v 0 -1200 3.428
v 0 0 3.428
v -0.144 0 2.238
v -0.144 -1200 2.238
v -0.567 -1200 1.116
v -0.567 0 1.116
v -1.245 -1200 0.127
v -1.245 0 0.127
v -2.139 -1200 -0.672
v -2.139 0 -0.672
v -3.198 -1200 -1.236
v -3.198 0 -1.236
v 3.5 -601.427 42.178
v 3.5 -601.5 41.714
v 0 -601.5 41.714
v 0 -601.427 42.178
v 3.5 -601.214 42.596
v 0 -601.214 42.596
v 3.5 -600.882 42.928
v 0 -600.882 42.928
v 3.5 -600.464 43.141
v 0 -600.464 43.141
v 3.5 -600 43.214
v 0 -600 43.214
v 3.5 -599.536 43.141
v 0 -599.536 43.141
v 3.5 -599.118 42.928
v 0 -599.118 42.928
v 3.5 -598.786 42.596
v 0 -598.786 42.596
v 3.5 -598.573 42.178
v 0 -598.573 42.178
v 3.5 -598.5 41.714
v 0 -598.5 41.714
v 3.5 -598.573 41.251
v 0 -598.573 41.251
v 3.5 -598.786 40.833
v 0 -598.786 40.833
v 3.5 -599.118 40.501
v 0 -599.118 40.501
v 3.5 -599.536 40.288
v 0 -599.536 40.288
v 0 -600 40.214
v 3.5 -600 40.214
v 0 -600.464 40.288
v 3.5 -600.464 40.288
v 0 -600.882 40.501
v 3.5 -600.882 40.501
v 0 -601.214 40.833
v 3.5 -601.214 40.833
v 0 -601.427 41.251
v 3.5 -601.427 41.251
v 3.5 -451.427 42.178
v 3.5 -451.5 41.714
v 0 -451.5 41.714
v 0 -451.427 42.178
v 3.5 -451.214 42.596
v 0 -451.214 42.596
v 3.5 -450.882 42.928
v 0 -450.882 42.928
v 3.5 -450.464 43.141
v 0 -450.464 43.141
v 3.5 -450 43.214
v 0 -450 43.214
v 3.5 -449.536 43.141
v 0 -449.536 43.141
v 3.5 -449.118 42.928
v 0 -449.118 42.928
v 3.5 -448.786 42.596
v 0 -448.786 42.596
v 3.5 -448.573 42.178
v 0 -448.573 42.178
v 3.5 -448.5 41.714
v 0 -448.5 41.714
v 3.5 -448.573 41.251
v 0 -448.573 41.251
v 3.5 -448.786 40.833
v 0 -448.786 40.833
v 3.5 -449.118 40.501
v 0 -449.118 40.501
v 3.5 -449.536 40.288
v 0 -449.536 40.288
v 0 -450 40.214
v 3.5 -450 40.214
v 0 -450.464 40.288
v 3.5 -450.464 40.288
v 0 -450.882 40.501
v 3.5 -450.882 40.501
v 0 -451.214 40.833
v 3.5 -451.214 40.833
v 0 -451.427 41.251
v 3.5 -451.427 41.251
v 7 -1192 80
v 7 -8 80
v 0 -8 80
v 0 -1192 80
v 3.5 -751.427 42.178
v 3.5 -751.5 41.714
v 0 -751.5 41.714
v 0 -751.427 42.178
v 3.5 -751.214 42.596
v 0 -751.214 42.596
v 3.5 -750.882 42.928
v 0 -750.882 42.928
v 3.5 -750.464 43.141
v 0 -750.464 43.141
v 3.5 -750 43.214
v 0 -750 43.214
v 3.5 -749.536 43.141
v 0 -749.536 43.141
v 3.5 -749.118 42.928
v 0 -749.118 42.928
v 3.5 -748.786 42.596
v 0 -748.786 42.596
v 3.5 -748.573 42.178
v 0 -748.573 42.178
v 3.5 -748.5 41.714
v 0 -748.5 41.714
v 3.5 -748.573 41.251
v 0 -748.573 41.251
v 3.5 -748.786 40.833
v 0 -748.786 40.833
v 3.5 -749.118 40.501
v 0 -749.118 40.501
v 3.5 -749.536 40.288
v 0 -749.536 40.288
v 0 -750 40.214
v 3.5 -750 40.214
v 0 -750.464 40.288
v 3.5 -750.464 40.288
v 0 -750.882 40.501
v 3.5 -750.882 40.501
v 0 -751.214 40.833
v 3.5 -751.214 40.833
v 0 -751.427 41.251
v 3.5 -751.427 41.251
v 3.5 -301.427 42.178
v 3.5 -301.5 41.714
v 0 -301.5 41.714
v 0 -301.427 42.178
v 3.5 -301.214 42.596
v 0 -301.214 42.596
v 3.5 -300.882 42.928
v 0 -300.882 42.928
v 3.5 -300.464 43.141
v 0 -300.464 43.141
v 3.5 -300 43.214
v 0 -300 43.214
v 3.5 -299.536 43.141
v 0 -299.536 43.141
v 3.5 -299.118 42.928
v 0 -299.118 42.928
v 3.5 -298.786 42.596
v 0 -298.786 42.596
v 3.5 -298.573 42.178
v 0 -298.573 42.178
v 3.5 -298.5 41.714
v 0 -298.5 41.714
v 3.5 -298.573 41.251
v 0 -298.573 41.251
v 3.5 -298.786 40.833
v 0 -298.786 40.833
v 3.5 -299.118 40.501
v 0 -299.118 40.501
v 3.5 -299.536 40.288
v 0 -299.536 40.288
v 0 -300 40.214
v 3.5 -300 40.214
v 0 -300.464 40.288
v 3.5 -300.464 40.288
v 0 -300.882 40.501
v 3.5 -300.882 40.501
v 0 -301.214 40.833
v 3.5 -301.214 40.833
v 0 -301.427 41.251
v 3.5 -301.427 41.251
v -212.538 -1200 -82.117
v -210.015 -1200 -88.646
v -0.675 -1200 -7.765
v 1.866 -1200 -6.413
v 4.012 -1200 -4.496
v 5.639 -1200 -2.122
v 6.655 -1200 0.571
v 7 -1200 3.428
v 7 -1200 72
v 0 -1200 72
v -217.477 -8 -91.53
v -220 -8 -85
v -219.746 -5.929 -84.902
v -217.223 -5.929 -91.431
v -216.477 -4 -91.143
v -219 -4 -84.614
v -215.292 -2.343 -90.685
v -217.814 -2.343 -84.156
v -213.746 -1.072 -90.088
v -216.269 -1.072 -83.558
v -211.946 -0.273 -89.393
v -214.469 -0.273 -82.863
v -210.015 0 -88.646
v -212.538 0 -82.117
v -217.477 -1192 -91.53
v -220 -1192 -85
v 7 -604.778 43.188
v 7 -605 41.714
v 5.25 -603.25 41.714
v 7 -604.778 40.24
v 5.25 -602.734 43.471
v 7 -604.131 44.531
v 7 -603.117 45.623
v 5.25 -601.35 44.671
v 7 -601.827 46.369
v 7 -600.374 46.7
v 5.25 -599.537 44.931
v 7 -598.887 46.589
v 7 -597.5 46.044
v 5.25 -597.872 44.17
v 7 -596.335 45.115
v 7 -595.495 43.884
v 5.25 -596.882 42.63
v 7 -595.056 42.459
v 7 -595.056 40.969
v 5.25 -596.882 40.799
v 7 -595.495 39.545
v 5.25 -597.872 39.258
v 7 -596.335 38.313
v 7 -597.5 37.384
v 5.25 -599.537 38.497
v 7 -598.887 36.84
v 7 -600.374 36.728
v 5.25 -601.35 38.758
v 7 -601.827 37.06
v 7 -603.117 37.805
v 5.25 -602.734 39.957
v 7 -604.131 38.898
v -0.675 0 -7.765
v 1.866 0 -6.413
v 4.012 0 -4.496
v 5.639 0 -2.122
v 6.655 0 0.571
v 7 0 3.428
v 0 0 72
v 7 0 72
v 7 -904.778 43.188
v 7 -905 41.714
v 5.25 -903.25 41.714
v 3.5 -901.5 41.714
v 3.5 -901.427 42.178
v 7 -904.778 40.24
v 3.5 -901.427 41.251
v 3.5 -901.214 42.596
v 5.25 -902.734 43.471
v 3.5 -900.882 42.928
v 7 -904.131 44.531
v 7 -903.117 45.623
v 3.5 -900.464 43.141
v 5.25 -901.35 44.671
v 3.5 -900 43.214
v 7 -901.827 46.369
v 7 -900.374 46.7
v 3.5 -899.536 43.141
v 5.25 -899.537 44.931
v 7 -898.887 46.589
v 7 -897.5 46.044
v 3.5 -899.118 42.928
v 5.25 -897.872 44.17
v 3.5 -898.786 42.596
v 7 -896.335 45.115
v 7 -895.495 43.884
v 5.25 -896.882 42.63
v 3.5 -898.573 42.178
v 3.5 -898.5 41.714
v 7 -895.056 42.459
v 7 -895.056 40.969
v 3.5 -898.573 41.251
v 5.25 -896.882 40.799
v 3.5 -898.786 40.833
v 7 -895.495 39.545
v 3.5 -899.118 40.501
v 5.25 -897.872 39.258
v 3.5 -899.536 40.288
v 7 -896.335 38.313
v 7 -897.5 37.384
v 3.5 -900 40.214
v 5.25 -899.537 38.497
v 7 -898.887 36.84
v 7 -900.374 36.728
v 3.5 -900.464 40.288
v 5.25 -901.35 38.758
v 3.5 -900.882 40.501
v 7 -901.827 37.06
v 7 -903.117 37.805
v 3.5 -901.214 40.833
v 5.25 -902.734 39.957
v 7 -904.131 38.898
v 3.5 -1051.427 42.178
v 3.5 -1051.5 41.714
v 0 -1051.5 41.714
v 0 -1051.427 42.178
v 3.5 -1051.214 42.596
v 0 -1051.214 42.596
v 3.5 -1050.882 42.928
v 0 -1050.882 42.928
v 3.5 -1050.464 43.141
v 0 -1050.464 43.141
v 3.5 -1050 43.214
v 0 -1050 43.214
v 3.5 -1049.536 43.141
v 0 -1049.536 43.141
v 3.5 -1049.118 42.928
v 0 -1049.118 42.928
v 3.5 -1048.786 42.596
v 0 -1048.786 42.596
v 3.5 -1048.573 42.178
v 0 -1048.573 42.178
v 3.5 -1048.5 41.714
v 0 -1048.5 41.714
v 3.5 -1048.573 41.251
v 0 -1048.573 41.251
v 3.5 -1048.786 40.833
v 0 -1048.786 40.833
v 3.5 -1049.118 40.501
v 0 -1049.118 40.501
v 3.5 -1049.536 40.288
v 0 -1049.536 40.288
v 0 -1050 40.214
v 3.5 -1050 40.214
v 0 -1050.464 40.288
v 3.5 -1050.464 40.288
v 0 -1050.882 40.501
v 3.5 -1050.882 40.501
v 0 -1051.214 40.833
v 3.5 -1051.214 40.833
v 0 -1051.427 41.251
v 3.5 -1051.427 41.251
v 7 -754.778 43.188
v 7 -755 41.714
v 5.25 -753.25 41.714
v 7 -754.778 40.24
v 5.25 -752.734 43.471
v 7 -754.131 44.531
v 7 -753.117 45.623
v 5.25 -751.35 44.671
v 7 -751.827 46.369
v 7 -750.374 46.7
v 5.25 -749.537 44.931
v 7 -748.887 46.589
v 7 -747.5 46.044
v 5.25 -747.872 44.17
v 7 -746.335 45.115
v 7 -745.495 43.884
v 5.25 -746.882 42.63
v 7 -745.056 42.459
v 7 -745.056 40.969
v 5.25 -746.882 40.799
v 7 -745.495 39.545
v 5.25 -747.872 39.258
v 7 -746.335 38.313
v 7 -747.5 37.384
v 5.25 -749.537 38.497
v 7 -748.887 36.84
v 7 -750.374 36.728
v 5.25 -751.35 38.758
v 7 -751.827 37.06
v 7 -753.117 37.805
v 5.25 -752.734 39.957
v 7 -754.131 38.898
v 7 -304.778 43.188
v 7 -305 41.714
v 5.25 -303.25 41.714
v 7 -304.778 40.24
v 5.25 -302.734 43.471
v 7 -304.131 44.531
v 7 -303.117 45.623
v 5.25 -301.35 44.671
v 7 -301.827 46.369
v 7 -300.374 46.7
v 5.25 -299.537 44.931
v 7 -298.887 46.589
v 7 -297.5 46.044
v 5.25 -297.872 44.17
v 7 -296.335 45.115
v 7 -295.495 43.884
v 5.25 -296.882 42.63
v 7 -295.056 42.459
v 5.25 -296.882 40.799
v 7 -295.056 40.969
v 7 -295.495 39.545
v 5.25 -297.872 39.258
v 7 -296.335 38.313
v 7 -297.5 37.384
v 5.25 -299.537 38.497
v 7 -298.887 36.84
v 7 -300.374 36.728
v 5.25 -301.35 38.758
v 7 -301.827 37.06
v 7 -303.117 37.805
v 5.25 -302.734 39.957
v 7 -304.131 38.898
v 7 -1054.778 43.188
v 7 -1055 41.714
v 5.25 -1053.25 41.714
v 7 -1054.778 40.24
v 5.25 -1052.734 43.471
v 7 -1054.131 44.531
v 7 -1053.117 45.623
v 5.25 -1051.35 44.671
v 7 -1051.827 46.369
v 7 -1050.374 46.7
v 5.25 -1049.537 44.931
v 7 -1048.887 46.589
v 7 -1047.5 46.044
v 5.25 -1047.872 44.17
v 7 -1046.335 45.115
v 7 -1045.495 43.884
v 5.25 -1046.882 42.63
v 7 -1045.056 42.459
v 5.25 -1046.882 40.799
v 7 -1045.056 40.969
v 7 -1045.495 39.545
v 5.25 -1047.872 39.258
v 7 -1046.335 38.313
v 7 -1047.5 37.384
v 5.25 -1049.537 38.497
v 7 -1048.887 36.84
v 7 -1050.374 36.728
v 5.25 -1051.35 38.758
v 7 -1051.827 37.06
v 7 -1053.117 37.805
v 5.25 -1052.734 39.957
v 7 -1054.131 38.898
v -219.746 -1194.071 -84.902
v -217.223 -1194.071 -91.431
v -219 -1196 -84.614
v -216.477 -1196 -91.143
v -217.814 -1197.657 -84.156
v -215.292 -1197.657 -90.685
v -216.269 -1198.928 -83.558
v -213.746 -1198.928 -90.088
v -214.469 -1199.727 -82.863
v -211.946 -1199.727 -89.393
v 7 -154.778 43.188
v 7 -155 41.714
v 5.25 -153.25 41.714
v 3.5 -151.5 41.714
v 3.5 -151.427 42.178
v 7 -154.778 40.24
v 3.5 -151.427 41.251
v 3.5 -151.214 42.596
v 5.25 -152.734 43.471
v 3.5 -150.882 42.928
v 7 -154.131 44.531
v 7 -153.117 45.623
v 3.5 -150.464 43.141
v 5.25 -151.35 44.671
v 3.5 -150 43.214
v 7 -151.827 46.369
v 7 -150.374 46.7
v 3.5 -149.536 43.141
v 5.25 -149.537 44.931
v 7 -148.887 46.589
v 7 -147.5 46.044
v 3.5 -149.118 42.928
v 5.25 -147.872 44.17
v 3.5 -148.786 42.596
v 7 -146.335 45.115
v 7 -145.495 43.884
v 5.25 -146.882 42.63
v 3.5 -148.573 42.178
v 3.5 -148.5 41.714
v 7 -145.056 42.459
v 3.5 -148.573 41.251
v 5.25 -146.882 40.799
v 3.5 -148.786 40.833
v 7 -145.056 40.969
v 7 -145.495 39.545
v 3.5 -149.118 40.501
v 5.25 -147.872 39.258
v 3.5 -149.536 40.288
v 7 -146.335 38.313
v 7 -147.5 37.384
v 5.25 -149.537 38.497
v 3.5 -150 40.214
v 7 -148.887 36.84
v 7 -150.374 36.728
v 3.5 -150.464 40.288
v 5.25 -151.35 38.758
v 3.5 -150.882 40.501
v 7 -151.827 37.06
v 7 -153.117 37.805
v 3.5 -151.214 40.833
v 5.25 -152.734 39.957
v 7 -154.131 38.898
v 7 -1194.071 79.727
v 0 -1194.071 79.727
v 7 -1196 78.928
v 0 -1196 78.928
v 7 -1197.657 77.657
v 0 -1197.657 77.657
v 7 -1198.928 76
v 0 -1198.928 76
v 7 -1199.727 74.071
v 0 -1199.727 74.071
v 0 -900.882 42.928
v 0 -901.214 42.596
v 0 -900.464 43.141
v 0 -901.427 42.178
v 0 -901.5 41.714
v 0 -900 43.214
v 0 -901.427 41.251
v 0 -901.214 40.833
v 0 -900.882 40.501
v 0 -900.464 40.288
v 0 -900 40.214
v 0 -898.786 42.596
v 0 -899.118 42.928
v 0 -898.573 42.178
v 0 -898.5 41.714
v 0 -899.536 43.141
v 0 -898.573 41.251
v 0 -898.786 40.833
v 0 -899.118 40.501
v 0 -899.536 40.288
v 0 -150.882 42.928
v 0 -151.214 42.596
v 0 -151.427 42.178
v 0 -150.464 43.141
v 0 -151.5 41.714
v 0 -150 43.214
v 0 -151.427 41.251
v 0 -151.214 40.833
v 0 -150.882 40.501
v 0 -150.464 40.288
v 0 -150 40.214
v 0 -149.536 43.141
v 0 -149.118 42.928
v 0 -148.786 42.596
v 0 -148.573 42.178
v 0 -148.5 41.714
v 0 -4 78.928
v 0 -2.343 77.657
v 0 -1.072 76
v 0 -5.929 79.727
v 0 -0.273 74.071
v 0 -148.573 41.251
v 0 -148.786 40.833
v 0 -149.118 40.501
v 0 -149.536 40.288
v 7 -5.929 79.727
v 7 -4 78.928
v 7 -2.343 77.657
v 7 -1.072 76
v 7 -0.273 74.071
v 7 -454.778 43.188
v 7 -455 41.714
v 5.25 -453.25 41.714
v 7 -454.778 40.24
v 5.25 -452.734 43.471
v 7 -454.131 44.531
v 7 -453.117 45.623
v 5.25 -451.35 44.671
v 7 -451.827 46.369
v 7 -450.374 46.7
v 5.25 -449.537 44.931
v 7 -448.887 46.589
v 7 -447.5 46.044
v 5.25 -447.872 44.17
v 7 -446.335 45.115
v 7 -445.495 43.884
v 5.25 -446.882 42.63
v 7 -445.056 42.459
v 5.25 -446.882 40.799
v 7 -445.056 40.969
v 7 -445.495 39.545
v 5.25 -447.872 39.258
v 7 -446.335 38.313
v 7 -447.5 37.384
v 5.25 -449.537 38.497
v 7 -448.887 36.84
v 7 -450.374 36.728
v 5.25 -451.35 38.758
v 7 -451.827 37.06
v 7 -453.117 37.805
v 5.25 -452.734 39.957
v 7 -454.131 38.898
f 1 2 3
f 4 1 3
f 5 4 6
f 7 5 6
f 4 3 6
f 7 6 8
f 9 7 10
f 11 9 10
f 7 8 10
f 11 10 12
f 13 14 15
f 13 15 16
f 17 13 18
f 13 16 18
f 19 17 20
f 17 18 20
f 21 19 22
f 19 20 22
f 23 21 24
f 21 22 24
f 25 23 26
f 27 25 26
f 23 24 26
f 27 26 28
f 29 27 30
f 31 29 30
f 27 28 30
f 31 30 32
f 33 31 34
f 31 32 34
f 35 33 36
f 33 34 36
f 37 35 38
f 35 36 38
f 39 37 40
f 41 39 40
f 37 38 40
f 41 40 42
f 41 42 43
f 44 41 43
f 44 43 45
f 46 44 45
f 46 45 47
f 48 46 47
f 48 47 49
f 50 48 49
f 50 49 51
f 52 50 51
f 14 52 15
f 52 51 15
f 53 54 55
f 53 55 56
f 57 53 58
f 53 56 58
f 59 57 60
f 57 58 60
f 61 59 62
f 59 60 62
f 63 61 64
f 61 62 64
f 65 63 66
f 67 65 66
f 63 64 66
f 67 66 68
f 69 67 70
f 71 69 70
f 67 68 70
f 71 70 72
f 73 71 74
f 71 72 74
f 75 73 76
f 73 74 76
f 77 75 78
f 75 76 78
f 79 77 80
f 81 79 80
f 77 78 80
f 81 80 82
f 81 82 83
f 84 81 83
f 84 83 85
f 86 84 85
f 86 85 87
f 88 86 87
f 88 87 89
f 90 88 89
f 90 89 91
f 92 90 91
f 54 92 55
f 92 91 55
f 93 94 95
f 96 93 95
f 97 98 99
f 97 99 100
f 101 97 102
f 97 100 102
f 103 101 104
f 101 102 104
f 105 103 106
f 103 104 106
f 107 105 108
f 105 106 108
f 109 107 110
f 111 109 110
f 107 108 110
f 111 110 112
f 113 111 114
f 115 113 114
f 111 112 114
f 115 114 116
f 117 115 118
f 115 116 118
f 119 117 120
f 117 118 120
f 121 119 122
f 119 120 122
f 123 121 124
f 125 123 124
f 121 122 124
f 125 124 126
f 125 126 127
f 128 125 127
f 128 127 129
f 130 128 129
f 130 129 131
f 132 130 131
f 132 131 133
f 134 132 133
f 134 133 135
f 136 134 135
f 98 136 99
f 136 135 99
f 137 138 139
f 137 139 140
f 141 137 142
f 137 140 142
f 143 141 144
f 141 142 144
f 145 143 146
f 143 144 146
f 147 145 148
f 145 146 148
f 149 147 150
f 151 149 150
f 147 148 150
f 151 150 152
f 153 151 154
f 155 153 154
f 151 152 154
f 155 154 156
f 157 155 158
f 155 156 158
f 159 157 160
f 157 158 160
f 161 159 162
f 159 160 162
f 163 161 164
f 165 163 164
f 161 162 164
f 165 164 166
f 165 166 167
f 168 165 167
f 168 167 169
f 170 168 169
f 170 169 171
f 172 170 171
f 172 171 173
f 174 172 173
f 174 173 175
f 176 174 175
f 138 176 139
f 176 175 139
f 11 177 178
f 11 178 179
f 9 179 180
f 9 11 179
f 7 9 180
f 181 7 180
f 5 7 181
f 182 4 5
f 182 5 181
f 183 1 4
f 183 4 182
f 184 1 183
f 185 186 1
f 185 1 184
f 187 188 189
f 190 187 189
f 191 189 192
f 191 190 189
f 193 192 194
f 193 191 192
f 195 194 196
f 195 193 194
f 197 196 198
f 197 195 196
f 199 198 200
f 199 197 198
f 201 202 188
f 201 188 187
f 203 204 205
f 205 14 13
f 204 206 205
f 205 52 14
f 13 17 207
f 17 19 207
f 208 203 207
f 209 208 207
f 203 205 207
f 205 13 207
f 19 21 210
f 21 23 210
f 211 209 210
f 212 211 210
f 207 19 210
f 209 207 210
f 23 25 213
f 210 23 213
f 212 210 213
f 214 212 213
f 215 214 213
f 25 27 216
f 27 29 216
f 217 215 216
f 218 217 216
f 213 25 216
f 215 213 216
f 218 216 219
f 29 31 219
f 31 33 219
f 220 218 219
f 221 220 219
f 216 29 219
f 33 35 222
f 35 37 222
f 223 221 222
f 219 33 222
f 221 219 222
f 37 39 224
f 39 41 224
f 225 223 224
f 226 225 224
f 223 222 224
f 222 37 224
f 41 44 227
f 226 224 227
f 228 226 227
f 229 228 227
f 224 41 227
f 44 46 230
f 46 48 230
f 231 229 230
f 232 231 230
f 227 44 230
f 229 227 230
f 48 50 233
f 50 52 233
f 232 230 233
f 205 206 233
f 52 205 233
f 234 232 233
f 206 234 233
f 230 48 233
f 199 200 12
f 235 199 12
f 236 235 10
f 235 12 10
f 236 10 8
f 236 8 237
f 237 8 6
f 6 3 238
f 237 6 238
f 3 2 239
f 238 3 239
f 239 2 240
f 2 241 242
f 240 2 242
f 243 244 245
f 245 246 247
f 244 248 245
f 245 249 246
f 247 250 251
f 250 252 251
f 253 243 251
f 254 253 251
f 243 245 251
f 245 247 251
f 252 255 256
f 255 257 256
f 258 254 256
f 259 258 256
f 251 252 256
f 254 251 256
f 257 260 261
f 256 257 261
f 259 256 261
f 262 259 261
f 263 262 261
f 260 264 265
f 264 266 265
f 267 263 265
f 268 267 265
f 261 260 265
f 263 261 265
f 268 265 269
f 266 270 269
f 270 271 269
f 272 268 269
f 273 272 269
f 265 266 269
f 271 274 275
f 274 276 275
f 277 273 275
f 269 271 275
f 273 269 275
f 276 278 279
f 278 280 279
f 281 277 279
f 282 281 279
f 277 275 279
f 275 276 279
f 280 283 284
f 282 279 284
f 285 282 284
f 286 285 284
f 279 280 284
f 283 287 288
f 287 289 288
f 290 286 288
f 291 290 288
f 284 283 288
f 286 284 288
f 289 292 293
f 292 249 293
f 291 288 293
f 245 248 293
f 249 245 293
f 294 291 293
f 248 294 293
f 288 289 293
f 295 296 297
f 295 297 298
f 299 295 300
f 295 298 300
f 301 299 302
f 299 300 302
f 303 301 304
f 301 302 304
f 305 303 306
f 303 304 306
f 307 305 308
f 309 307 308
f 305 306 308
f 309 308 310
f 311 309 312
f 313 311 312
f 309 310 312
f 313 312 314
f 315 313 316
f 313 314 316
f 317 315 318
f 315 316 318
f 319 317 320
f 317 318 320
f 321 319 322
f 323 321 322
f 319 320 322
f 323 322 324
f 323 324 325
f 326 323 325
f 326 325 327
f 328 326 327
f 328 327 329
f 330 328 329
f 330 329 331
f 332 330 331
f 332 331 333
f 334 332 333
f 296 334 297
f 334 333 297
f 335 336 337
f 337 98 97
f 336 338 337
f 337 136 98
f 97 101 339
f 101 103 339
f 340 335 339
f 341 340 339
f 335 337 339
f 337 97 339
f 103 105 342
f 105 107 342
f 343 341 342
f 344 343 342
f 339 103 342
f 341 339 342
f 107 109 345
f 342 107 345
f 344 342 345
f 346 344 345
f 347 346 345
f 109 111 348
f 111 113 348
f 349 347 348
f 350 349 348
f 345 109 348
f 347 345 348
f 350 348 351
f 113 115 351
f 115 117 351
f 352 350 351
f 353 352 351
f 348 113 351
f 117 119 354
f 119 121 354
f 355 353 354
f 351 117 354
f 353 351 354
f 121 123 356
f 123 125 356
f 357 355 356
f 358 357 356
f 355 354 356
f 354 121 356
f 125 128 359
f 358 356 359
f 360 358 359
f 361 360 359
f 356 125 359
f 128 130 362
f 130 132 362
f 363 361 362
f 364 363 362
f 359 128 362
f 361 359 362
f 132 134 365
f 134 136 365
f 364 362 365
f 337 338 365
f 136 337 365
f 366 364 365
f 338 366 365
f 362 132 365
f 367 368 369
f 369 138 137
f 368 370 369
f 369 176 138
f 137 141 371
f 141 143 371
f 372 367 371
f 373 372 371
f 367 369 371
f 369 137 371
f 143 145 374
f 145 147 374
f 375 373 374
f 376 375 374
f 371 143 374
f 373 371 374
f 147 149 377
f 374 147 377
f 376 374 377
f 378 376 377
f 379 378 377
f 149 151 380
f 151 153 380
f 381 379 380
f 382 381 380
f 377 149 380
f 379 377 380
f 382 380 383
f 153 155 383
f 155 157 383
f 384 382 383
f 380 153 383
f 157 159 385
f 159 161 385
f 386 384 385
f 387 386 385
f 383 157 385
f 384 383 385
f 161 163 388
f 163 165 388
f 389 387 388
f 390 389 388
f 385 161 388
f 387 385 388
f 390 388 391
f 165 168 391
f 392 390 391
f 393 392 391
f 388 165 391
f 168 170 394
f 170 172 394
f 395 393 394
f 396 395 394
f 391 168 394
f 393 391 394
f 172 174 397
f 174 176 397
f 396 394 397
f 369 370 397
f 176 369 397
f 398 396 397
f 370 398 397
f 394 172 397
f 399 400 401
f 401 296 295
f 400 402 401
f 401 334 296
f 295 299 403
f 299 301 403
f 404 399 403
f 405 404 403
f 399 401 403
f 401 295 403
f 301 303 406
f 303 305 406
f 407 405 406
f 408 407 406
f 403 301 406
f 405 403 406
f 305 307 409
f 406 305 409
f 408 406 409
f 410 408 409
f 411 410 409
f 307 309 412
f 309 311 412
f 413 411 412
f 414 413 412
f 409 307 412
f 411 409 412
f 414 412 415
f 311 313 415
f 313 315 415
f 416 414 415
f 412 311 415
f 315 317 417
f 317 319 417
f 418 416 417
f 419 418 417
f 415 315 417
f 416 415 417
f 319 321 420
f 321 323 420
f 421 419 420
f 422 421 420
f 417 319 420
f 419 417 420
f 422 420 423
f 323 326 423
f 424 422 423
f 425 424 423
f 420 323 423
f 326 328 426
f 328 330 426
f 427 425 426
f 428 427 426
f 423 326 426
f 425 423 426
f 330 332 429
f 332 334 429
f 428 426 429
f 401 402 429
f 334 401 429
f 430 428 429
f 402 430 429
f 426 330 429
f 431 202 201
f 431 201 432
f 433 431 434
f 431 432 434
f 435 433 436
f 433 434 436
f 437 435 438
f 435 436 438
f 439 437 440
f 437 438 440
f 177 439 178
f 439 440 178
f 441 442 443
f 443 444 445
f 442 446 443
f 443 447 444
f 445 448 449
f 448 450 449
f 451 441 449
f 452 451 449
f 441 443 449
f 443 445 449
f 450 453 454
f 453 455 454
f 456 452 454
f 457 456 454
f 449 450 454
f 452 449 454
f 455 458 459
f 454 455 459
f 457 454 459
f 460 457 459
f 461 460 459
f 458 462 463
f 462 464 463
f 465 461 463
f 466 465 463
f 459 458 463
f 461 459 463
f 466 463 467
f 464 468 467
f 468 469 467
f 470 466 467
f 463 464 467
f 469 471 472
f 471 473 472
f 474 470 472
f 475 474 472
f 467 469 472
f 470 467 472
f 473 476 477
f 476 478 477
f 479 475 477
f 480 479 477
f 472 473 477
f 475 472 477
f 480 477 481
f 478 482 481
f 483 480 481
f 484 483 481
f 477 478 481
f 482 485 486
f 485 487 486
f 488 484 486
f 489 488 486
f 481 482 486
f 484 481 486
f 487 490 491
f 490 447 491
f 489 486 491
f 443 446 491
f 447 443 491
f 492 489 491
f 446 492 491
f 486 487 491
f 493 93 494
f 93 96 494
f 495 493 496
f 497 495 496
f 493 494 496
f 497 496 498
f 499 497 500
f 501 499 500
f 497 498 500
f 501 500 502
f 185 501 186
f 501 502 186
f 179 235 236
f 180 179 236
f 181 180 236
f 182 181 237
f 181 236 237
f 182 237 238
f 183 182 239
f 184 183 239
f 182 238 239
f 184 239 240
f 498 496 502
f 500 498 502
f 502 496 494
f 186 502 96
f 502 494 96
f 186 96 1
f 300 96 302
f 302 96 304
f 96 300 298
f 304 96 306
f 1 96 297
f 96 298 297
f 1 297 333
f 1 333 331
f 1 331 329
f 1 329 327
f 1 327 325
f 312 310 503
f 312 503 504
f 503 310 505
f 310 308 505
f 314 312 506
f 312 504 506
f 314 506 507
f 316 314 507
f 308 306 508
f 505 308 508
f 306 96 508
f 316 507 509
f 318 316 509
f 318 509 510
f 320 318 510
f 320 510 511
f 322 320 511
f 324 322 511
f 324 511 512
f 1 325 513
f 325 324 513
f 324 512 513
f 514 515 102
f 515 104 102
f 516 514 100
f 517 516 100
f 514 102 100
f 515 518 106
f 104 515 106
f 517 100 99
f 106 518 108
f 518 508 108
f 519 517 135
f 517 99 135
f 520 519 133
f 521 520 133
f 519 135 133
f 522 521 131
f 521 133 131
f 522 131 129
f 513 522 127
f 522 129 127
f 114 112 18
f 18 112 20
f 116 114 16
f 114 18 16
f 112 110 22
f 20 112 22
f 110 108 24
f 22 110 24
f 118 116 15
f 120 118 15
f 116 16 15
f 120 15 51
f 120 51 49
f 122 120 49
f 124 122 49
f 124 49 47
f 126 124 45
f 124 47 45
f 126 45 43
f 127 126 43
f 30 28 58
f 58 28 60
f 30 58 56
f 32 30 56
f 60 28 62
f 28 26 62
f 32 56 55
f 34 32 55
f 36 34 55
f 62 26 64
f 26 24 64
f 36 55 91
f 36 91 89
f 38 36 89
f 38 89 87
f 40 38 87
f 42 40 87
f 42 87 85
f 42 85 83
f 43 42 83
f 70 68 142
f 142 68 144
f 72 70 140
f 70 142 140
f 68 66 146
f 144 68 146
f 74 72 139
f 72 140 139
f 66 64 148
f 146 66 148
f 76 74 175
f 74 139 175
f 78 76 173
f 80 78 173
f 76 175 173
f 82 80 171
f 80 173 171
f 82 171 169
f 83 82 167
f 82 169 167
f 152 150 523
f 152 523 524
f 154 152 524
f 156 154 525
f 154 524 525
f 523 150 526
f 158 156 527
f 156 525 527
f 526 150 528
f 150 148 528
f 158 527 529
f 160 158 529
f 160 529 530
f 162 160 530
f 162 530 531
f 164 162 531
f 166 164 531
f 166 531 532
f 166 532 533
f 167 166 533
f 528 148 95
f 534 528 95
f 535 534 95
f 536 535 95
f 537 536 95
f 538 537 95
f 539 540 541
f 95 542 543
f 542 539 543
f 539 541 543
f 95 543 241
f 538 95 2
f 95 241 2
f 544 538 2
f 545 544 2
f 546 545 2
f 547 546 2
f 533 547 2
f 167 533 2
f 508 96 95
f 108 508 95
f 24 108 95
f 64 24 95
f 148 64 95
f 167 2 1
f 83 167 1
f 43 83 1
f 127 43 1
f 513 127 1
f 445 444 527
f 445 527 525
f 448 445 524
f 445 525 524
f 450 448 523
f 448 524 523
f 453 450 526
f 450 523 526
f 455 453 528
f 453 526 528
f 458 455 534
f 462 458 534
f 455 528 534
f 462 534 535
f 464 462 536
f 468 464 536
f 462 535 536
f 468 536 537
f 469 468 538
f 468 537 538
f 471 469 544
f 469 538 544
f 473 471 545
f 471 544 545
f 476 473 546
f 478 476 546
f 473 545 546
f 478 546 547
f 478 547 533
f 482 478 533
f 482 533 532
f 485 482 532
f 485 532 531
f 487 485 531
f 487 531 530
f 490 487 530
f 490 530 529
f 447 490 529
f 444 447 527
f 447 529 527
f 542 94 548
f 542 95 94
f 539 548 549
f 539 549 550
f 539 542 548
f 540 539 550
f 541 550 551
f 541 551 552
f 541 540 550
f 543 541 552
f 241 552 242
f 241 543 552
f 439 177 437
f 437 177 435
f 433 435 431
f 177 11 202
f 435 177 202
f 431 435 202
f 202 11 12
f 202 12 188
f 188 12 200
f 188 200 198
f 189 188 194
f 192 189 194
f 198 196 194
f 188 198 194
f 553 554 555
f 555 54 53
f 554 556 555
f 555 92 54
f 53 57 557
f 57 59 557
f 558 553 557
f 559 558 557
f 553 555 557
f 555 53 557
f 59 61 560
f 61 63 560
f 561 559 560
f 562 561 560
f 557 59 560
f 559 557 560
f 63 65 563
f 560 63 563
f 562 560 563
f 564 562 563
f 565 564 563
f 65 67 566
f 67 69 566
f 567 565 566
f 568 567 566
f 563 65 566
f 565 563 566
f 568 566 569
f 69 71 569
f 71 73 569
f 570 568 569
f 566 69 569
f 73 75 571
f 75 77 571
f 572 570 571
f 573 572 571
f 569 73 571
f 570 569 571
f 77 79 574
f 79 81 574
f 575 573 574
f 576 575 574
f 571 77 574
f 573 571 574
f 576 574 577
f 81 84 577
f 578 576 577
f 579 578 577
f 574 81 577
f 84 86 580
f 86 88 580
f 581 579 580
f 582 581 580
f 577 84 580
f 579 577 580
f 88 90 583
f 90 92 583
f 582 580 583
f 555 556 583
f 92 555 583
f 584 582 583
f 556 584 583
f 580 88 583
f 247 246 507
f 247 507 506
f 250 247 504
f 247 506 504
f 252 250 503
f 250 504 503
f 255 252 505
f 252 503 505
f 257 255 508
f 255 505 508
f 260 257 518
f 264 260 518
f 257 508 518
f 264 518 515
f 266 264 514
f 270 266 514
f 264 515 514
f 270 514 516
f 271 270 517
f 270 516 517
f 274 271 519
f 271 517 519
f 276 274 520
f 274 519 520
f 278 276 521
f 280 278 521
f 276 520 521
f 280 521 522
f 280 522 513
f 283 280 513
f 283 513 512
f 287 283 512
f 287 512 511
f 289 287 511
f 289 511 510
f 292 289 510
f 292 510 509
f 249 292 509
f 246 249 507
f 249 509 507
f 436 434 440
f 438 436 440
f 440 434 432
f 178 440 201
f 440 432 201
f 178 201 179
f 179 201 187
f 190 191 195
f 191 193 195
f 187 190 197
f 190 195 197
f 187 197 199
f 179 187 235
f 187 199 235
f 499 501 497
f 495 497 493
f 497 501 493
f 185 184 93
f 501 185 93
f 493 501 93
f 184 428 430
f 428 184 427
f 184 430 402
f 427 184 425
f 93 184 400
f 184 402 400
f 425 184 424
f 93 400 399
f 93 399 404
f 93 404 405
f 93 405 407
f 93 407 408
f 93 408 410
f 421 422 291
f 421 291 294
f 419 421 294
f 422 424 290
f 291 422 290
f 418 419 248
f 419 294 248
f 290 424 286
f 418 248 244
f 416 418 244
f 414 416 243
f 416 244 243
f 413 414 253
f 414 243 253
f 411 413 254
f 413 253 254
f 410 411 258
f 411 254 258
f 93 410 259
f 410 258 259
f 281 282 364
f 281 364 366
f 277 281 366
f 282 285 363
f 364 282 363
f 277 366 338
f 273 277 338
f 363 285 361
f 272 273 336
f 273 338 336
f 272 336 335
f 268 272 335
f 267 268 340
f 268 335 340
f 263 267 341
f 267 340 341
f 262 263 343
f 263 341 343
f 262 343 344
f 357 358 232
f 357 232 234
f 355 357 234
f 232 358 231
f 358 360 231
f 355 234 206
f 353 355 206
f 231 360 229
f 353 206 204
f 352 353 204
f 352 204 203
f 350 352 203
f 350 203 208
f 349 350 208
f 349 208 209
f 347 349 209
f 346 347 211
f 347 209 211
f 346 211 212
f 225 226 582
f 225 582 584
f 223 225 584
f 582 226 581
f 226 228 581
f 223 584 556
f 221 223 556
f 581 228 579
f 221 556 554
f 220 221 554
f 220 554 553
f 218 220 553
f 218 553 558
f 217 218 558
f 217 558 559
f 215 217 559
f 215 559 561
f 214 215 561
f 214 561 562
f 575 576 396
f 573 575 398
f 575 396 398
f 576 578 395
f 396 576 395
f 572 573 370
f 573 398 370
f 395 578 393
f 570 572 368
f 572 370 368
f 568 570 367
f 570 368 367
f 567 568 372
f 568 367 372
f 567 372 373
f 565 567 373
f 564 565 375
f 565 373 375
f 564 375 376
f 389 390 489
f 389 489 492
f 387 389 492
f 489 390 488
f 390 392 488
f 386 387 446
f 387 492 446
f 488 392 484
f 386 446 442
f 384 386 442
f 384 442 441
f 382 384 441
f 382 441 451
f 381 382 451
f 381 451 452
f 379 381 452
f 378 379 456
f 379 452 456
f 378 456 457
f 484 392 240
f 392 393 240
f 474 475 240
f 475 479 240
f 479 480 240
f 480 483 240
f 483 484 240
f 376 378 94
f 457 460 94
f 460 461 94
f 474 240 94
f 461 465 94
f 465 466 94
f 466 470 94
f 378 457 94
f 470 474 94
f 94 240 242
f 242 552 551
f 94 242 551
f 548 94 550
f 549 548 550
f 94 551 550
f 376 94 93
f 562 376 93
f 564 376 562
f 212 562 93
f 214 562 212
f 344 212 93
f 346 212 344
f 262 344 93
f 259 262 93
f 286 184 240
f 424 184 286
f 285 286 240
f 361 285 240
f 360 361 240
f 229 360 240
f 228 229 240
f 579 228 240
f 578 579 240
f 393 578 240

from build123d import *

# Parameters (mm, degrees)
F1_DEPTH       = 1200
F2_R           = 8
F4_D           = 3
F4_CSINK_D     = 10
F4_CSINK_ANGLE = 90


with BuildPart() as f1:
    # F0 (on Front) → F1 (new body)
    with BuildSketch(Plane.XZ):
        with BuildLine():
            Line((7, 80), (0, 80))
            Line((0, 80), (0, 3.428398))
            ThreePointArc((0, 3.428398), (-0.876289, 0.600854), (-3.198004, -1.235592))
            Line((-3.198004, -1.235592), (-220, -85))
            Line((-220, -85), (-217.477205, -91.529587))
            Line((-217.477205, -91.529587), (-0.675209, -7.765179))
            ThreePointArc((-0.675209, -7.765179), (4.896906, -3.357709), (7, 3.428398))
            Line((7, 3.428398), (7, 80))
        make_face()
    extrude(amount=F1_DEPTH)

    # F2
    f2_edges = [f1.edges().sort_by_distance(p)[0] for p in [
        (3.5, -1200, 80),
        (3.5, 0, 80),
        (-218.738603, 0, -88.264793),
        (-218.738603, -1200, -88.264793),
    ]]
    fillet(f2_edges, radius=F2_R)

    # F4 (through all)
    with Locations(Plane.YZ.offset(7)):
        with Locations((-900, 41.714199), (-1050, 41.714199), (-750, 41.714199), (-600, 41.714199), (-450, 41.714199), (-300, 41.714199), (-150, 41.714199)):
            CounterSinkHole(F4_D / 2, F4_CSINK_D / 2, counter_sink_angle=F4_CSINK_ANGLE)


solid = f1.part
